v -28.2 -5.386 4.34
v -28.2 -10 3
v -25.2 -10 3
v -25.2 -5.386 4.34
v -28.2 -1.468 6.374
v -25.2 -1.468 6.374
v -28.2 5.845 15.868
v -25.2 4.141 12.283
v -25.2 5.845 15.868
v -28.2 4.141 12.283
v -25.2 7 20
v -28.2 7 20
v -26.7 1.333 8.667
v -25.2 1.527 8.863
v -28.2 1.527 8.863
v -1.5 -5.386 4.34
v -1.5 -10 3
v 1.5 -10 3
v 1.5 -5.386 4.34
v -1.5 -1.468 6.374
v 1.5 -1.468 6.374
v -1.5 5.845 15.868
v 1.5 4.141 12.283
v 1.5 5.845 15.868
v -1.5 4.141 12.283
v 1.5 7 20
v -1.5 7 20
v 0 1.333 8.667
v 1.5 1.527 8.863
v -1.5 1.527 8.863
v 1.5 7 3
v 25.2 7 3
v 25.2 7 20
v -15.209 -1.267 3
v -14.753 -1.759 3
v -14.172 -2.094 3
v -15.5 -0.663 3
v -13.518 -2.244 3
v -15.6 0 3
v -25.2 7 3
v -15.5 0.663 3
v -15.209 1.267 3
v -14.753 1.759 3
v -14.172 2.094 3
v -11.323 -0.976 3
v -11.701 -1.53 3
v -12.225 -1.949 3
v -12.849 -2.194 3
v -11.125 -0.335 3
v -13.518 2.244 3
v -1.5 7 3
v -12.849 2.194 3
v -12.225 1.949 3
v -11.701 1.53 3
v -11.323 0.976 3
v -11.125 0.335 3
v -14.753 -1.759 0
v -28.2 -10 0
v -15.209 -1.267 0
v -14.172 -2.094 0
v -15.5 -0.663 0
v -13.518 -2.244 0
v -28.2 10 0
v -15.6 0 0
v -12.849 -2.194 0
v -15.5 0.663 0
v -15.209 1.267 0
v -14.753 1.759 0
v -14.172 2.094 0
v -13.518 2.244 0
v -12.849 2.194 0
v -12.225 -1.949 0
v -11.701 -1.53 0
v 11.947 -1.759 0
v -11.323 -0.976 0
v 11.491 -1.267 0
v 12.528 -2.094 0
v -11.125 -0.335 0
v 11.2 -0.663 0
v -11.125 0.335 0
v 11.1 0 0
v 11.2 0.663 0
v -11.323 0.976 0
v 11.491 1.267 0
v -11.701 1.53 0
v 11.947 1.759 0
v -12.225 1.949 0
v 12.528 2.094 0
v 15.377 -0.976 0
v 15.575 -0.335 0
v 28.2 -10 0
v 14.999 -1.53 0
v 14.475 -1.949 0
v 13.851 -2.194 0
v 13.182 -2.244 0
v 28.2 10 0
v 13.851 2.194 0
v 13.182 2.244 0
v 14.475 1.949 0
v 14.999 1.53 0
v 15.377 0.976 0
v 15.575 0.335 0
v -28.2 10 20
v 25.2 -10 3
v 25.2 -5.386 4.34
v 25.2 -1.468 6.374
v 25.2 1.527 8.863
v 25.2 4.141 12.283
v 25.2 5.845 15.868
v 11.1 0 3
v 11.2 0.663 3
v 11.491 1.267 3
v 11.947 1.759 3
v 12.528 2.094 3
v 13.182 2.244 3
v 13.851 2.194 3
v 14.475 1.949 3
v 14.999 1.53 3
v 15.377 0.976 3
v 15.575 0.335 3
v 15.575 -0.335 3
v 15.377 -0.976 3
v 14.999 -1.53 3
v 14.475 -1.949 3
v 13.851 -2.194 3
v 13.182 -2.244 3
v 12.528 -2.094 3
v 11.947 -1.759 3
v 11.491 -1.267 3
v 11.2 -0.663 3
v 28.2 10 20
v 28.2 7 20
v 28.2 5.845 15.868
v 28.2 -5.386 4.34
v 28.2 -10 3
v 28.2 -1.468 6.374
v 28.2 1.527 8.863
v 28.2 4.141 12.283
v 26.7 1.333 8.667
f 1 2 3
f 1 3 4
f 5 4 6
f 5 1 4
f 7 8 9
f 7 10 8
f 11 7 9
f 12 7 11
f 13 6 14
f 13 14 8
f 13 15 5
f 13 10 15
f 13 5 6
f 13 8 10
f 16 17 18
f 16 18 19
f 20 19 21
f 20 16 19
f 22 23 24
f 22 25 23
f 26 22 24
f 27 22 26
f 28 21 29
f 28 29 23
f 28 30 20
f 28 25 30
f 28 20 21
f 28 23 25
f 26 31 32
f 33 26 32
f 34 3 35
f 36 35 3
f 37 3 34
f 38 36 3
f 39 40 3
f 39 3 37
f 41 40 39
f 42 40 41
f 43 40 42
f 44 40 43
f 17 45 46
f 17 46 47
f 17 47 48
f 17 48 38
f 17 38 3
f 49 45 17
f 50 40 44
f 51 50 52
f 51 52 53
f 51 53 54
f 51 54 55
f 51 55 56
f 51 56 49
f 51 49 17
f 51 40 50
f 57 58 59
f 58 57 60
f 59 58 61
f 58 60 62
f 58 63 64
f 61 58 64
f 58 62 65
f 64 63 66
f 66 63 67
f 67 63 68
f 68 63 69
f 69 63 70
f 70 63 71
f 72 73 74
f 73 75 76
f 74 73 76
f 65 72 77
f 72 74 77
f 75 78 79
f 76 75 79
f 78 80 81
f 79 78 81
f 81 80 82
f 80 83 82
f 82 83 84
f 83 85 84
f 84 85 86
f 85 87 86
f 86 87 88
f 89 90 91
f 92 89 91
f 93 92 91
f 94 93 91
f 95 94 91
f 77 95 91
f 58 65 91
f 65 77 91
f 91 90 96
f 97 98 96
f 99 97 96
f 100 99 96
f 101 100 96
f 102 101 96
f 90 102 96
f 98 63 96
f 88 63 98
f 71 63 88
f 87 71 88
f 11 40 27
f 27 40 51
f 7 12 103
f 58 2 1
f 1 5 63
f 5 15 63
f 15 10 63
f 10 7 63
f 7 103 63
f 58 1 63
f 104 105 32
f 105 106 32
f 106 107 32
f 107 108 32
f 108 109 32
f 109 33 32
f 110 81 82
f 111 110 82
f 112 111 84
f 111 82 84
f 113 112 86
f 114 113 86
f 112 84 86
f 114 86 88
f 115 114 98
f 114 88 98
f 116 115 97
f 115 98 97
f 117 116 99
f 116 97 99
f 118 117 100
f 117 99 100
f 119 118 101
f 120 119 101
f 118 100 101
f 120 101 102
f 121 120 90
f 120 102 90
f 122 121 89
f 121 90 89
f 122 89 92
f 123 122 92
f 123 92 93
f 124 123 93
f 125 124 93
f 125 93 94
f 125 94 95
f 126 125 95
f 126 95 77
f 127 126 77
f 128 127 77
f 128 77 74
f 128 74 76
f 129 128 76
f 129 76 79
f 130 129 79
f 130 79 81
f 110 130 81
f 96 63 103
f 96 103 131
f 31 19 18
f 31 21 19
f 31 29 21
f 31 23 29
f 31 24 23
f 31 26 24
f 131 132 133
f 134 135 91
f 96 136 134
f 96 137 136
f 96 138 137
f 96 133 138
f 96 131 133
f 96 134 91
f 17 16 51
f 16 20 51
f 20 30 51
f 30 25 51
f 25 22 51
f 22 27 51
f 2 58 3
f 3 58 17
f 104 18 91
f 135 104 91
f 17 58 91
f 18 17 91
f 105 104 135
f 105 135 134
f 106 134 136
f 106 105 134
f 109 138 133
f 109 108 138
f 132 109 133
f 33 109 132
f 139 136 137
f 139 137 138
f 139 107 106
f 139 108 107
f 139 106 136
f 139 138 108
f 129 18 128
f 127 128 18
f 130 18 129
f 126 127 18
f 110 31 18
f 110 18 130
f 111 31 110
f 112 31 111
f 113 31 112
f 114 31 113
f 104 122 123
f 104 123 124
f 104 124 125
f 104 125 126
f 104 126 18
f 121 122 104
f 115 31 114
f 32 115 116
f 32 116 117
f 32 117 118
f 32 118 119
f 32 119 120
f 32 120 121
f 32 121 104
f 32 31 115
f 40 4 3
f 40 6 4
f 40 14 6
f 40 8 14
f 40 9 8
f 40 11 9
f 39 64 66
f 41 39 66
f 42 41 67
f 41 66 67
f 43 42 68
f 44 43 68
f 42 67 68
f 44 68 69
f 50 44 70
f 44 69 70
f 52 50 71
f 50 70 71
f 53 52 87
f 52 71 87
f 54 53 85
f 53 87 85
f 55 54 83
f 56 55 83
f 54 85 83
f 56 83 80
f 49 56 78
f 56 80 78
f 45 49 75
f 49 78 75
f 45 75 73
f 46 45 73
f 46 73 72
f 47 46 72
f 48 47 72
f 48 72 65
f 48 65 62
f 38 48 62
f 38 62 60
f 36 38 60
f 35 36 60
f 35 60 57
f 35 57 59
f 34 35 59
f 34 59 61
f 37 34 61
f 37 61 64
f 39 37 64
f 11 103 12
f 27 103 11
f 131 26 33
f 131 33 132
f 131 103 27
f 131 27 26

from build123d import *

# Parameters (mm, degrees)
SKETCH_1_W             = 56.4
SKETCH_1_H             = 20
EXTRUDE_1_DEPTH        = 3
SKETCH_2_W             = 56.4
SKETCH_2_H             = 3
EXTRUDE_2_DEPTH        = 17
EXTRUDE_3_DEPTH        = 3
PATTERN_LINEAR_1_COUNT = 3
PATTERN_LINEAR_1_PITCH = 26.7
HOLE_WIZARD_M4_1_D     = 4.5


with BuildPart() as part:
    # 스케치1 → 보스-돌출1 (new body)
    with BuildSketch(Plane.XY):
        Rectangle(SKETCH_1_W, SKETCH_1_H)
    extrude(amount=EXTRUDE_1_DEPTH)

    # 스케치2 → 보스-돌출2 (add)
    with BuildSketch(Plane.XY.offset(3)):
        with Locations((0, 8.5)):
            Rectangle(SKETCH_2_W, SKETCH_2_H)
    extrude(amount=EXTRUDE_2_DEPTH)

    # 스케치4 → 보스-돌출3 (add)
    with BuildSketch(Plane.ZY.offset(28.2)):
        with BuildLine():
            Line((3, -10), (3, 7))
            Line((3, 7), (20, 7))
            add(Edge.make_bspline(
                [(3, -10), (5.833333333, 4.166666667), (20, 7)],
                knots=[0, 0, 0, 1, 1, 1], degree=2))
        make_face()
    extrude_3 = extrude(amount=-EXTRUDE_3_DEPTH)

    # 선형 패턴1: 보스-돌출3 ×3
    with Locations(*[(i * PATTERN_LINEAR_1_PITCH, 0, 0) for i in range(1, PATTERN_LINEAR_1_COUNT)]):
        add(extrude_3)

    # M4 여유 구멍1 (through all)
    with Locations(Plane.XY.offset(3)):
        with Locations((-13.35, 0), (13.35, 0)):
            Hole(HOLE_WIZARD_M4_1_D / 2)


solid = part.part
